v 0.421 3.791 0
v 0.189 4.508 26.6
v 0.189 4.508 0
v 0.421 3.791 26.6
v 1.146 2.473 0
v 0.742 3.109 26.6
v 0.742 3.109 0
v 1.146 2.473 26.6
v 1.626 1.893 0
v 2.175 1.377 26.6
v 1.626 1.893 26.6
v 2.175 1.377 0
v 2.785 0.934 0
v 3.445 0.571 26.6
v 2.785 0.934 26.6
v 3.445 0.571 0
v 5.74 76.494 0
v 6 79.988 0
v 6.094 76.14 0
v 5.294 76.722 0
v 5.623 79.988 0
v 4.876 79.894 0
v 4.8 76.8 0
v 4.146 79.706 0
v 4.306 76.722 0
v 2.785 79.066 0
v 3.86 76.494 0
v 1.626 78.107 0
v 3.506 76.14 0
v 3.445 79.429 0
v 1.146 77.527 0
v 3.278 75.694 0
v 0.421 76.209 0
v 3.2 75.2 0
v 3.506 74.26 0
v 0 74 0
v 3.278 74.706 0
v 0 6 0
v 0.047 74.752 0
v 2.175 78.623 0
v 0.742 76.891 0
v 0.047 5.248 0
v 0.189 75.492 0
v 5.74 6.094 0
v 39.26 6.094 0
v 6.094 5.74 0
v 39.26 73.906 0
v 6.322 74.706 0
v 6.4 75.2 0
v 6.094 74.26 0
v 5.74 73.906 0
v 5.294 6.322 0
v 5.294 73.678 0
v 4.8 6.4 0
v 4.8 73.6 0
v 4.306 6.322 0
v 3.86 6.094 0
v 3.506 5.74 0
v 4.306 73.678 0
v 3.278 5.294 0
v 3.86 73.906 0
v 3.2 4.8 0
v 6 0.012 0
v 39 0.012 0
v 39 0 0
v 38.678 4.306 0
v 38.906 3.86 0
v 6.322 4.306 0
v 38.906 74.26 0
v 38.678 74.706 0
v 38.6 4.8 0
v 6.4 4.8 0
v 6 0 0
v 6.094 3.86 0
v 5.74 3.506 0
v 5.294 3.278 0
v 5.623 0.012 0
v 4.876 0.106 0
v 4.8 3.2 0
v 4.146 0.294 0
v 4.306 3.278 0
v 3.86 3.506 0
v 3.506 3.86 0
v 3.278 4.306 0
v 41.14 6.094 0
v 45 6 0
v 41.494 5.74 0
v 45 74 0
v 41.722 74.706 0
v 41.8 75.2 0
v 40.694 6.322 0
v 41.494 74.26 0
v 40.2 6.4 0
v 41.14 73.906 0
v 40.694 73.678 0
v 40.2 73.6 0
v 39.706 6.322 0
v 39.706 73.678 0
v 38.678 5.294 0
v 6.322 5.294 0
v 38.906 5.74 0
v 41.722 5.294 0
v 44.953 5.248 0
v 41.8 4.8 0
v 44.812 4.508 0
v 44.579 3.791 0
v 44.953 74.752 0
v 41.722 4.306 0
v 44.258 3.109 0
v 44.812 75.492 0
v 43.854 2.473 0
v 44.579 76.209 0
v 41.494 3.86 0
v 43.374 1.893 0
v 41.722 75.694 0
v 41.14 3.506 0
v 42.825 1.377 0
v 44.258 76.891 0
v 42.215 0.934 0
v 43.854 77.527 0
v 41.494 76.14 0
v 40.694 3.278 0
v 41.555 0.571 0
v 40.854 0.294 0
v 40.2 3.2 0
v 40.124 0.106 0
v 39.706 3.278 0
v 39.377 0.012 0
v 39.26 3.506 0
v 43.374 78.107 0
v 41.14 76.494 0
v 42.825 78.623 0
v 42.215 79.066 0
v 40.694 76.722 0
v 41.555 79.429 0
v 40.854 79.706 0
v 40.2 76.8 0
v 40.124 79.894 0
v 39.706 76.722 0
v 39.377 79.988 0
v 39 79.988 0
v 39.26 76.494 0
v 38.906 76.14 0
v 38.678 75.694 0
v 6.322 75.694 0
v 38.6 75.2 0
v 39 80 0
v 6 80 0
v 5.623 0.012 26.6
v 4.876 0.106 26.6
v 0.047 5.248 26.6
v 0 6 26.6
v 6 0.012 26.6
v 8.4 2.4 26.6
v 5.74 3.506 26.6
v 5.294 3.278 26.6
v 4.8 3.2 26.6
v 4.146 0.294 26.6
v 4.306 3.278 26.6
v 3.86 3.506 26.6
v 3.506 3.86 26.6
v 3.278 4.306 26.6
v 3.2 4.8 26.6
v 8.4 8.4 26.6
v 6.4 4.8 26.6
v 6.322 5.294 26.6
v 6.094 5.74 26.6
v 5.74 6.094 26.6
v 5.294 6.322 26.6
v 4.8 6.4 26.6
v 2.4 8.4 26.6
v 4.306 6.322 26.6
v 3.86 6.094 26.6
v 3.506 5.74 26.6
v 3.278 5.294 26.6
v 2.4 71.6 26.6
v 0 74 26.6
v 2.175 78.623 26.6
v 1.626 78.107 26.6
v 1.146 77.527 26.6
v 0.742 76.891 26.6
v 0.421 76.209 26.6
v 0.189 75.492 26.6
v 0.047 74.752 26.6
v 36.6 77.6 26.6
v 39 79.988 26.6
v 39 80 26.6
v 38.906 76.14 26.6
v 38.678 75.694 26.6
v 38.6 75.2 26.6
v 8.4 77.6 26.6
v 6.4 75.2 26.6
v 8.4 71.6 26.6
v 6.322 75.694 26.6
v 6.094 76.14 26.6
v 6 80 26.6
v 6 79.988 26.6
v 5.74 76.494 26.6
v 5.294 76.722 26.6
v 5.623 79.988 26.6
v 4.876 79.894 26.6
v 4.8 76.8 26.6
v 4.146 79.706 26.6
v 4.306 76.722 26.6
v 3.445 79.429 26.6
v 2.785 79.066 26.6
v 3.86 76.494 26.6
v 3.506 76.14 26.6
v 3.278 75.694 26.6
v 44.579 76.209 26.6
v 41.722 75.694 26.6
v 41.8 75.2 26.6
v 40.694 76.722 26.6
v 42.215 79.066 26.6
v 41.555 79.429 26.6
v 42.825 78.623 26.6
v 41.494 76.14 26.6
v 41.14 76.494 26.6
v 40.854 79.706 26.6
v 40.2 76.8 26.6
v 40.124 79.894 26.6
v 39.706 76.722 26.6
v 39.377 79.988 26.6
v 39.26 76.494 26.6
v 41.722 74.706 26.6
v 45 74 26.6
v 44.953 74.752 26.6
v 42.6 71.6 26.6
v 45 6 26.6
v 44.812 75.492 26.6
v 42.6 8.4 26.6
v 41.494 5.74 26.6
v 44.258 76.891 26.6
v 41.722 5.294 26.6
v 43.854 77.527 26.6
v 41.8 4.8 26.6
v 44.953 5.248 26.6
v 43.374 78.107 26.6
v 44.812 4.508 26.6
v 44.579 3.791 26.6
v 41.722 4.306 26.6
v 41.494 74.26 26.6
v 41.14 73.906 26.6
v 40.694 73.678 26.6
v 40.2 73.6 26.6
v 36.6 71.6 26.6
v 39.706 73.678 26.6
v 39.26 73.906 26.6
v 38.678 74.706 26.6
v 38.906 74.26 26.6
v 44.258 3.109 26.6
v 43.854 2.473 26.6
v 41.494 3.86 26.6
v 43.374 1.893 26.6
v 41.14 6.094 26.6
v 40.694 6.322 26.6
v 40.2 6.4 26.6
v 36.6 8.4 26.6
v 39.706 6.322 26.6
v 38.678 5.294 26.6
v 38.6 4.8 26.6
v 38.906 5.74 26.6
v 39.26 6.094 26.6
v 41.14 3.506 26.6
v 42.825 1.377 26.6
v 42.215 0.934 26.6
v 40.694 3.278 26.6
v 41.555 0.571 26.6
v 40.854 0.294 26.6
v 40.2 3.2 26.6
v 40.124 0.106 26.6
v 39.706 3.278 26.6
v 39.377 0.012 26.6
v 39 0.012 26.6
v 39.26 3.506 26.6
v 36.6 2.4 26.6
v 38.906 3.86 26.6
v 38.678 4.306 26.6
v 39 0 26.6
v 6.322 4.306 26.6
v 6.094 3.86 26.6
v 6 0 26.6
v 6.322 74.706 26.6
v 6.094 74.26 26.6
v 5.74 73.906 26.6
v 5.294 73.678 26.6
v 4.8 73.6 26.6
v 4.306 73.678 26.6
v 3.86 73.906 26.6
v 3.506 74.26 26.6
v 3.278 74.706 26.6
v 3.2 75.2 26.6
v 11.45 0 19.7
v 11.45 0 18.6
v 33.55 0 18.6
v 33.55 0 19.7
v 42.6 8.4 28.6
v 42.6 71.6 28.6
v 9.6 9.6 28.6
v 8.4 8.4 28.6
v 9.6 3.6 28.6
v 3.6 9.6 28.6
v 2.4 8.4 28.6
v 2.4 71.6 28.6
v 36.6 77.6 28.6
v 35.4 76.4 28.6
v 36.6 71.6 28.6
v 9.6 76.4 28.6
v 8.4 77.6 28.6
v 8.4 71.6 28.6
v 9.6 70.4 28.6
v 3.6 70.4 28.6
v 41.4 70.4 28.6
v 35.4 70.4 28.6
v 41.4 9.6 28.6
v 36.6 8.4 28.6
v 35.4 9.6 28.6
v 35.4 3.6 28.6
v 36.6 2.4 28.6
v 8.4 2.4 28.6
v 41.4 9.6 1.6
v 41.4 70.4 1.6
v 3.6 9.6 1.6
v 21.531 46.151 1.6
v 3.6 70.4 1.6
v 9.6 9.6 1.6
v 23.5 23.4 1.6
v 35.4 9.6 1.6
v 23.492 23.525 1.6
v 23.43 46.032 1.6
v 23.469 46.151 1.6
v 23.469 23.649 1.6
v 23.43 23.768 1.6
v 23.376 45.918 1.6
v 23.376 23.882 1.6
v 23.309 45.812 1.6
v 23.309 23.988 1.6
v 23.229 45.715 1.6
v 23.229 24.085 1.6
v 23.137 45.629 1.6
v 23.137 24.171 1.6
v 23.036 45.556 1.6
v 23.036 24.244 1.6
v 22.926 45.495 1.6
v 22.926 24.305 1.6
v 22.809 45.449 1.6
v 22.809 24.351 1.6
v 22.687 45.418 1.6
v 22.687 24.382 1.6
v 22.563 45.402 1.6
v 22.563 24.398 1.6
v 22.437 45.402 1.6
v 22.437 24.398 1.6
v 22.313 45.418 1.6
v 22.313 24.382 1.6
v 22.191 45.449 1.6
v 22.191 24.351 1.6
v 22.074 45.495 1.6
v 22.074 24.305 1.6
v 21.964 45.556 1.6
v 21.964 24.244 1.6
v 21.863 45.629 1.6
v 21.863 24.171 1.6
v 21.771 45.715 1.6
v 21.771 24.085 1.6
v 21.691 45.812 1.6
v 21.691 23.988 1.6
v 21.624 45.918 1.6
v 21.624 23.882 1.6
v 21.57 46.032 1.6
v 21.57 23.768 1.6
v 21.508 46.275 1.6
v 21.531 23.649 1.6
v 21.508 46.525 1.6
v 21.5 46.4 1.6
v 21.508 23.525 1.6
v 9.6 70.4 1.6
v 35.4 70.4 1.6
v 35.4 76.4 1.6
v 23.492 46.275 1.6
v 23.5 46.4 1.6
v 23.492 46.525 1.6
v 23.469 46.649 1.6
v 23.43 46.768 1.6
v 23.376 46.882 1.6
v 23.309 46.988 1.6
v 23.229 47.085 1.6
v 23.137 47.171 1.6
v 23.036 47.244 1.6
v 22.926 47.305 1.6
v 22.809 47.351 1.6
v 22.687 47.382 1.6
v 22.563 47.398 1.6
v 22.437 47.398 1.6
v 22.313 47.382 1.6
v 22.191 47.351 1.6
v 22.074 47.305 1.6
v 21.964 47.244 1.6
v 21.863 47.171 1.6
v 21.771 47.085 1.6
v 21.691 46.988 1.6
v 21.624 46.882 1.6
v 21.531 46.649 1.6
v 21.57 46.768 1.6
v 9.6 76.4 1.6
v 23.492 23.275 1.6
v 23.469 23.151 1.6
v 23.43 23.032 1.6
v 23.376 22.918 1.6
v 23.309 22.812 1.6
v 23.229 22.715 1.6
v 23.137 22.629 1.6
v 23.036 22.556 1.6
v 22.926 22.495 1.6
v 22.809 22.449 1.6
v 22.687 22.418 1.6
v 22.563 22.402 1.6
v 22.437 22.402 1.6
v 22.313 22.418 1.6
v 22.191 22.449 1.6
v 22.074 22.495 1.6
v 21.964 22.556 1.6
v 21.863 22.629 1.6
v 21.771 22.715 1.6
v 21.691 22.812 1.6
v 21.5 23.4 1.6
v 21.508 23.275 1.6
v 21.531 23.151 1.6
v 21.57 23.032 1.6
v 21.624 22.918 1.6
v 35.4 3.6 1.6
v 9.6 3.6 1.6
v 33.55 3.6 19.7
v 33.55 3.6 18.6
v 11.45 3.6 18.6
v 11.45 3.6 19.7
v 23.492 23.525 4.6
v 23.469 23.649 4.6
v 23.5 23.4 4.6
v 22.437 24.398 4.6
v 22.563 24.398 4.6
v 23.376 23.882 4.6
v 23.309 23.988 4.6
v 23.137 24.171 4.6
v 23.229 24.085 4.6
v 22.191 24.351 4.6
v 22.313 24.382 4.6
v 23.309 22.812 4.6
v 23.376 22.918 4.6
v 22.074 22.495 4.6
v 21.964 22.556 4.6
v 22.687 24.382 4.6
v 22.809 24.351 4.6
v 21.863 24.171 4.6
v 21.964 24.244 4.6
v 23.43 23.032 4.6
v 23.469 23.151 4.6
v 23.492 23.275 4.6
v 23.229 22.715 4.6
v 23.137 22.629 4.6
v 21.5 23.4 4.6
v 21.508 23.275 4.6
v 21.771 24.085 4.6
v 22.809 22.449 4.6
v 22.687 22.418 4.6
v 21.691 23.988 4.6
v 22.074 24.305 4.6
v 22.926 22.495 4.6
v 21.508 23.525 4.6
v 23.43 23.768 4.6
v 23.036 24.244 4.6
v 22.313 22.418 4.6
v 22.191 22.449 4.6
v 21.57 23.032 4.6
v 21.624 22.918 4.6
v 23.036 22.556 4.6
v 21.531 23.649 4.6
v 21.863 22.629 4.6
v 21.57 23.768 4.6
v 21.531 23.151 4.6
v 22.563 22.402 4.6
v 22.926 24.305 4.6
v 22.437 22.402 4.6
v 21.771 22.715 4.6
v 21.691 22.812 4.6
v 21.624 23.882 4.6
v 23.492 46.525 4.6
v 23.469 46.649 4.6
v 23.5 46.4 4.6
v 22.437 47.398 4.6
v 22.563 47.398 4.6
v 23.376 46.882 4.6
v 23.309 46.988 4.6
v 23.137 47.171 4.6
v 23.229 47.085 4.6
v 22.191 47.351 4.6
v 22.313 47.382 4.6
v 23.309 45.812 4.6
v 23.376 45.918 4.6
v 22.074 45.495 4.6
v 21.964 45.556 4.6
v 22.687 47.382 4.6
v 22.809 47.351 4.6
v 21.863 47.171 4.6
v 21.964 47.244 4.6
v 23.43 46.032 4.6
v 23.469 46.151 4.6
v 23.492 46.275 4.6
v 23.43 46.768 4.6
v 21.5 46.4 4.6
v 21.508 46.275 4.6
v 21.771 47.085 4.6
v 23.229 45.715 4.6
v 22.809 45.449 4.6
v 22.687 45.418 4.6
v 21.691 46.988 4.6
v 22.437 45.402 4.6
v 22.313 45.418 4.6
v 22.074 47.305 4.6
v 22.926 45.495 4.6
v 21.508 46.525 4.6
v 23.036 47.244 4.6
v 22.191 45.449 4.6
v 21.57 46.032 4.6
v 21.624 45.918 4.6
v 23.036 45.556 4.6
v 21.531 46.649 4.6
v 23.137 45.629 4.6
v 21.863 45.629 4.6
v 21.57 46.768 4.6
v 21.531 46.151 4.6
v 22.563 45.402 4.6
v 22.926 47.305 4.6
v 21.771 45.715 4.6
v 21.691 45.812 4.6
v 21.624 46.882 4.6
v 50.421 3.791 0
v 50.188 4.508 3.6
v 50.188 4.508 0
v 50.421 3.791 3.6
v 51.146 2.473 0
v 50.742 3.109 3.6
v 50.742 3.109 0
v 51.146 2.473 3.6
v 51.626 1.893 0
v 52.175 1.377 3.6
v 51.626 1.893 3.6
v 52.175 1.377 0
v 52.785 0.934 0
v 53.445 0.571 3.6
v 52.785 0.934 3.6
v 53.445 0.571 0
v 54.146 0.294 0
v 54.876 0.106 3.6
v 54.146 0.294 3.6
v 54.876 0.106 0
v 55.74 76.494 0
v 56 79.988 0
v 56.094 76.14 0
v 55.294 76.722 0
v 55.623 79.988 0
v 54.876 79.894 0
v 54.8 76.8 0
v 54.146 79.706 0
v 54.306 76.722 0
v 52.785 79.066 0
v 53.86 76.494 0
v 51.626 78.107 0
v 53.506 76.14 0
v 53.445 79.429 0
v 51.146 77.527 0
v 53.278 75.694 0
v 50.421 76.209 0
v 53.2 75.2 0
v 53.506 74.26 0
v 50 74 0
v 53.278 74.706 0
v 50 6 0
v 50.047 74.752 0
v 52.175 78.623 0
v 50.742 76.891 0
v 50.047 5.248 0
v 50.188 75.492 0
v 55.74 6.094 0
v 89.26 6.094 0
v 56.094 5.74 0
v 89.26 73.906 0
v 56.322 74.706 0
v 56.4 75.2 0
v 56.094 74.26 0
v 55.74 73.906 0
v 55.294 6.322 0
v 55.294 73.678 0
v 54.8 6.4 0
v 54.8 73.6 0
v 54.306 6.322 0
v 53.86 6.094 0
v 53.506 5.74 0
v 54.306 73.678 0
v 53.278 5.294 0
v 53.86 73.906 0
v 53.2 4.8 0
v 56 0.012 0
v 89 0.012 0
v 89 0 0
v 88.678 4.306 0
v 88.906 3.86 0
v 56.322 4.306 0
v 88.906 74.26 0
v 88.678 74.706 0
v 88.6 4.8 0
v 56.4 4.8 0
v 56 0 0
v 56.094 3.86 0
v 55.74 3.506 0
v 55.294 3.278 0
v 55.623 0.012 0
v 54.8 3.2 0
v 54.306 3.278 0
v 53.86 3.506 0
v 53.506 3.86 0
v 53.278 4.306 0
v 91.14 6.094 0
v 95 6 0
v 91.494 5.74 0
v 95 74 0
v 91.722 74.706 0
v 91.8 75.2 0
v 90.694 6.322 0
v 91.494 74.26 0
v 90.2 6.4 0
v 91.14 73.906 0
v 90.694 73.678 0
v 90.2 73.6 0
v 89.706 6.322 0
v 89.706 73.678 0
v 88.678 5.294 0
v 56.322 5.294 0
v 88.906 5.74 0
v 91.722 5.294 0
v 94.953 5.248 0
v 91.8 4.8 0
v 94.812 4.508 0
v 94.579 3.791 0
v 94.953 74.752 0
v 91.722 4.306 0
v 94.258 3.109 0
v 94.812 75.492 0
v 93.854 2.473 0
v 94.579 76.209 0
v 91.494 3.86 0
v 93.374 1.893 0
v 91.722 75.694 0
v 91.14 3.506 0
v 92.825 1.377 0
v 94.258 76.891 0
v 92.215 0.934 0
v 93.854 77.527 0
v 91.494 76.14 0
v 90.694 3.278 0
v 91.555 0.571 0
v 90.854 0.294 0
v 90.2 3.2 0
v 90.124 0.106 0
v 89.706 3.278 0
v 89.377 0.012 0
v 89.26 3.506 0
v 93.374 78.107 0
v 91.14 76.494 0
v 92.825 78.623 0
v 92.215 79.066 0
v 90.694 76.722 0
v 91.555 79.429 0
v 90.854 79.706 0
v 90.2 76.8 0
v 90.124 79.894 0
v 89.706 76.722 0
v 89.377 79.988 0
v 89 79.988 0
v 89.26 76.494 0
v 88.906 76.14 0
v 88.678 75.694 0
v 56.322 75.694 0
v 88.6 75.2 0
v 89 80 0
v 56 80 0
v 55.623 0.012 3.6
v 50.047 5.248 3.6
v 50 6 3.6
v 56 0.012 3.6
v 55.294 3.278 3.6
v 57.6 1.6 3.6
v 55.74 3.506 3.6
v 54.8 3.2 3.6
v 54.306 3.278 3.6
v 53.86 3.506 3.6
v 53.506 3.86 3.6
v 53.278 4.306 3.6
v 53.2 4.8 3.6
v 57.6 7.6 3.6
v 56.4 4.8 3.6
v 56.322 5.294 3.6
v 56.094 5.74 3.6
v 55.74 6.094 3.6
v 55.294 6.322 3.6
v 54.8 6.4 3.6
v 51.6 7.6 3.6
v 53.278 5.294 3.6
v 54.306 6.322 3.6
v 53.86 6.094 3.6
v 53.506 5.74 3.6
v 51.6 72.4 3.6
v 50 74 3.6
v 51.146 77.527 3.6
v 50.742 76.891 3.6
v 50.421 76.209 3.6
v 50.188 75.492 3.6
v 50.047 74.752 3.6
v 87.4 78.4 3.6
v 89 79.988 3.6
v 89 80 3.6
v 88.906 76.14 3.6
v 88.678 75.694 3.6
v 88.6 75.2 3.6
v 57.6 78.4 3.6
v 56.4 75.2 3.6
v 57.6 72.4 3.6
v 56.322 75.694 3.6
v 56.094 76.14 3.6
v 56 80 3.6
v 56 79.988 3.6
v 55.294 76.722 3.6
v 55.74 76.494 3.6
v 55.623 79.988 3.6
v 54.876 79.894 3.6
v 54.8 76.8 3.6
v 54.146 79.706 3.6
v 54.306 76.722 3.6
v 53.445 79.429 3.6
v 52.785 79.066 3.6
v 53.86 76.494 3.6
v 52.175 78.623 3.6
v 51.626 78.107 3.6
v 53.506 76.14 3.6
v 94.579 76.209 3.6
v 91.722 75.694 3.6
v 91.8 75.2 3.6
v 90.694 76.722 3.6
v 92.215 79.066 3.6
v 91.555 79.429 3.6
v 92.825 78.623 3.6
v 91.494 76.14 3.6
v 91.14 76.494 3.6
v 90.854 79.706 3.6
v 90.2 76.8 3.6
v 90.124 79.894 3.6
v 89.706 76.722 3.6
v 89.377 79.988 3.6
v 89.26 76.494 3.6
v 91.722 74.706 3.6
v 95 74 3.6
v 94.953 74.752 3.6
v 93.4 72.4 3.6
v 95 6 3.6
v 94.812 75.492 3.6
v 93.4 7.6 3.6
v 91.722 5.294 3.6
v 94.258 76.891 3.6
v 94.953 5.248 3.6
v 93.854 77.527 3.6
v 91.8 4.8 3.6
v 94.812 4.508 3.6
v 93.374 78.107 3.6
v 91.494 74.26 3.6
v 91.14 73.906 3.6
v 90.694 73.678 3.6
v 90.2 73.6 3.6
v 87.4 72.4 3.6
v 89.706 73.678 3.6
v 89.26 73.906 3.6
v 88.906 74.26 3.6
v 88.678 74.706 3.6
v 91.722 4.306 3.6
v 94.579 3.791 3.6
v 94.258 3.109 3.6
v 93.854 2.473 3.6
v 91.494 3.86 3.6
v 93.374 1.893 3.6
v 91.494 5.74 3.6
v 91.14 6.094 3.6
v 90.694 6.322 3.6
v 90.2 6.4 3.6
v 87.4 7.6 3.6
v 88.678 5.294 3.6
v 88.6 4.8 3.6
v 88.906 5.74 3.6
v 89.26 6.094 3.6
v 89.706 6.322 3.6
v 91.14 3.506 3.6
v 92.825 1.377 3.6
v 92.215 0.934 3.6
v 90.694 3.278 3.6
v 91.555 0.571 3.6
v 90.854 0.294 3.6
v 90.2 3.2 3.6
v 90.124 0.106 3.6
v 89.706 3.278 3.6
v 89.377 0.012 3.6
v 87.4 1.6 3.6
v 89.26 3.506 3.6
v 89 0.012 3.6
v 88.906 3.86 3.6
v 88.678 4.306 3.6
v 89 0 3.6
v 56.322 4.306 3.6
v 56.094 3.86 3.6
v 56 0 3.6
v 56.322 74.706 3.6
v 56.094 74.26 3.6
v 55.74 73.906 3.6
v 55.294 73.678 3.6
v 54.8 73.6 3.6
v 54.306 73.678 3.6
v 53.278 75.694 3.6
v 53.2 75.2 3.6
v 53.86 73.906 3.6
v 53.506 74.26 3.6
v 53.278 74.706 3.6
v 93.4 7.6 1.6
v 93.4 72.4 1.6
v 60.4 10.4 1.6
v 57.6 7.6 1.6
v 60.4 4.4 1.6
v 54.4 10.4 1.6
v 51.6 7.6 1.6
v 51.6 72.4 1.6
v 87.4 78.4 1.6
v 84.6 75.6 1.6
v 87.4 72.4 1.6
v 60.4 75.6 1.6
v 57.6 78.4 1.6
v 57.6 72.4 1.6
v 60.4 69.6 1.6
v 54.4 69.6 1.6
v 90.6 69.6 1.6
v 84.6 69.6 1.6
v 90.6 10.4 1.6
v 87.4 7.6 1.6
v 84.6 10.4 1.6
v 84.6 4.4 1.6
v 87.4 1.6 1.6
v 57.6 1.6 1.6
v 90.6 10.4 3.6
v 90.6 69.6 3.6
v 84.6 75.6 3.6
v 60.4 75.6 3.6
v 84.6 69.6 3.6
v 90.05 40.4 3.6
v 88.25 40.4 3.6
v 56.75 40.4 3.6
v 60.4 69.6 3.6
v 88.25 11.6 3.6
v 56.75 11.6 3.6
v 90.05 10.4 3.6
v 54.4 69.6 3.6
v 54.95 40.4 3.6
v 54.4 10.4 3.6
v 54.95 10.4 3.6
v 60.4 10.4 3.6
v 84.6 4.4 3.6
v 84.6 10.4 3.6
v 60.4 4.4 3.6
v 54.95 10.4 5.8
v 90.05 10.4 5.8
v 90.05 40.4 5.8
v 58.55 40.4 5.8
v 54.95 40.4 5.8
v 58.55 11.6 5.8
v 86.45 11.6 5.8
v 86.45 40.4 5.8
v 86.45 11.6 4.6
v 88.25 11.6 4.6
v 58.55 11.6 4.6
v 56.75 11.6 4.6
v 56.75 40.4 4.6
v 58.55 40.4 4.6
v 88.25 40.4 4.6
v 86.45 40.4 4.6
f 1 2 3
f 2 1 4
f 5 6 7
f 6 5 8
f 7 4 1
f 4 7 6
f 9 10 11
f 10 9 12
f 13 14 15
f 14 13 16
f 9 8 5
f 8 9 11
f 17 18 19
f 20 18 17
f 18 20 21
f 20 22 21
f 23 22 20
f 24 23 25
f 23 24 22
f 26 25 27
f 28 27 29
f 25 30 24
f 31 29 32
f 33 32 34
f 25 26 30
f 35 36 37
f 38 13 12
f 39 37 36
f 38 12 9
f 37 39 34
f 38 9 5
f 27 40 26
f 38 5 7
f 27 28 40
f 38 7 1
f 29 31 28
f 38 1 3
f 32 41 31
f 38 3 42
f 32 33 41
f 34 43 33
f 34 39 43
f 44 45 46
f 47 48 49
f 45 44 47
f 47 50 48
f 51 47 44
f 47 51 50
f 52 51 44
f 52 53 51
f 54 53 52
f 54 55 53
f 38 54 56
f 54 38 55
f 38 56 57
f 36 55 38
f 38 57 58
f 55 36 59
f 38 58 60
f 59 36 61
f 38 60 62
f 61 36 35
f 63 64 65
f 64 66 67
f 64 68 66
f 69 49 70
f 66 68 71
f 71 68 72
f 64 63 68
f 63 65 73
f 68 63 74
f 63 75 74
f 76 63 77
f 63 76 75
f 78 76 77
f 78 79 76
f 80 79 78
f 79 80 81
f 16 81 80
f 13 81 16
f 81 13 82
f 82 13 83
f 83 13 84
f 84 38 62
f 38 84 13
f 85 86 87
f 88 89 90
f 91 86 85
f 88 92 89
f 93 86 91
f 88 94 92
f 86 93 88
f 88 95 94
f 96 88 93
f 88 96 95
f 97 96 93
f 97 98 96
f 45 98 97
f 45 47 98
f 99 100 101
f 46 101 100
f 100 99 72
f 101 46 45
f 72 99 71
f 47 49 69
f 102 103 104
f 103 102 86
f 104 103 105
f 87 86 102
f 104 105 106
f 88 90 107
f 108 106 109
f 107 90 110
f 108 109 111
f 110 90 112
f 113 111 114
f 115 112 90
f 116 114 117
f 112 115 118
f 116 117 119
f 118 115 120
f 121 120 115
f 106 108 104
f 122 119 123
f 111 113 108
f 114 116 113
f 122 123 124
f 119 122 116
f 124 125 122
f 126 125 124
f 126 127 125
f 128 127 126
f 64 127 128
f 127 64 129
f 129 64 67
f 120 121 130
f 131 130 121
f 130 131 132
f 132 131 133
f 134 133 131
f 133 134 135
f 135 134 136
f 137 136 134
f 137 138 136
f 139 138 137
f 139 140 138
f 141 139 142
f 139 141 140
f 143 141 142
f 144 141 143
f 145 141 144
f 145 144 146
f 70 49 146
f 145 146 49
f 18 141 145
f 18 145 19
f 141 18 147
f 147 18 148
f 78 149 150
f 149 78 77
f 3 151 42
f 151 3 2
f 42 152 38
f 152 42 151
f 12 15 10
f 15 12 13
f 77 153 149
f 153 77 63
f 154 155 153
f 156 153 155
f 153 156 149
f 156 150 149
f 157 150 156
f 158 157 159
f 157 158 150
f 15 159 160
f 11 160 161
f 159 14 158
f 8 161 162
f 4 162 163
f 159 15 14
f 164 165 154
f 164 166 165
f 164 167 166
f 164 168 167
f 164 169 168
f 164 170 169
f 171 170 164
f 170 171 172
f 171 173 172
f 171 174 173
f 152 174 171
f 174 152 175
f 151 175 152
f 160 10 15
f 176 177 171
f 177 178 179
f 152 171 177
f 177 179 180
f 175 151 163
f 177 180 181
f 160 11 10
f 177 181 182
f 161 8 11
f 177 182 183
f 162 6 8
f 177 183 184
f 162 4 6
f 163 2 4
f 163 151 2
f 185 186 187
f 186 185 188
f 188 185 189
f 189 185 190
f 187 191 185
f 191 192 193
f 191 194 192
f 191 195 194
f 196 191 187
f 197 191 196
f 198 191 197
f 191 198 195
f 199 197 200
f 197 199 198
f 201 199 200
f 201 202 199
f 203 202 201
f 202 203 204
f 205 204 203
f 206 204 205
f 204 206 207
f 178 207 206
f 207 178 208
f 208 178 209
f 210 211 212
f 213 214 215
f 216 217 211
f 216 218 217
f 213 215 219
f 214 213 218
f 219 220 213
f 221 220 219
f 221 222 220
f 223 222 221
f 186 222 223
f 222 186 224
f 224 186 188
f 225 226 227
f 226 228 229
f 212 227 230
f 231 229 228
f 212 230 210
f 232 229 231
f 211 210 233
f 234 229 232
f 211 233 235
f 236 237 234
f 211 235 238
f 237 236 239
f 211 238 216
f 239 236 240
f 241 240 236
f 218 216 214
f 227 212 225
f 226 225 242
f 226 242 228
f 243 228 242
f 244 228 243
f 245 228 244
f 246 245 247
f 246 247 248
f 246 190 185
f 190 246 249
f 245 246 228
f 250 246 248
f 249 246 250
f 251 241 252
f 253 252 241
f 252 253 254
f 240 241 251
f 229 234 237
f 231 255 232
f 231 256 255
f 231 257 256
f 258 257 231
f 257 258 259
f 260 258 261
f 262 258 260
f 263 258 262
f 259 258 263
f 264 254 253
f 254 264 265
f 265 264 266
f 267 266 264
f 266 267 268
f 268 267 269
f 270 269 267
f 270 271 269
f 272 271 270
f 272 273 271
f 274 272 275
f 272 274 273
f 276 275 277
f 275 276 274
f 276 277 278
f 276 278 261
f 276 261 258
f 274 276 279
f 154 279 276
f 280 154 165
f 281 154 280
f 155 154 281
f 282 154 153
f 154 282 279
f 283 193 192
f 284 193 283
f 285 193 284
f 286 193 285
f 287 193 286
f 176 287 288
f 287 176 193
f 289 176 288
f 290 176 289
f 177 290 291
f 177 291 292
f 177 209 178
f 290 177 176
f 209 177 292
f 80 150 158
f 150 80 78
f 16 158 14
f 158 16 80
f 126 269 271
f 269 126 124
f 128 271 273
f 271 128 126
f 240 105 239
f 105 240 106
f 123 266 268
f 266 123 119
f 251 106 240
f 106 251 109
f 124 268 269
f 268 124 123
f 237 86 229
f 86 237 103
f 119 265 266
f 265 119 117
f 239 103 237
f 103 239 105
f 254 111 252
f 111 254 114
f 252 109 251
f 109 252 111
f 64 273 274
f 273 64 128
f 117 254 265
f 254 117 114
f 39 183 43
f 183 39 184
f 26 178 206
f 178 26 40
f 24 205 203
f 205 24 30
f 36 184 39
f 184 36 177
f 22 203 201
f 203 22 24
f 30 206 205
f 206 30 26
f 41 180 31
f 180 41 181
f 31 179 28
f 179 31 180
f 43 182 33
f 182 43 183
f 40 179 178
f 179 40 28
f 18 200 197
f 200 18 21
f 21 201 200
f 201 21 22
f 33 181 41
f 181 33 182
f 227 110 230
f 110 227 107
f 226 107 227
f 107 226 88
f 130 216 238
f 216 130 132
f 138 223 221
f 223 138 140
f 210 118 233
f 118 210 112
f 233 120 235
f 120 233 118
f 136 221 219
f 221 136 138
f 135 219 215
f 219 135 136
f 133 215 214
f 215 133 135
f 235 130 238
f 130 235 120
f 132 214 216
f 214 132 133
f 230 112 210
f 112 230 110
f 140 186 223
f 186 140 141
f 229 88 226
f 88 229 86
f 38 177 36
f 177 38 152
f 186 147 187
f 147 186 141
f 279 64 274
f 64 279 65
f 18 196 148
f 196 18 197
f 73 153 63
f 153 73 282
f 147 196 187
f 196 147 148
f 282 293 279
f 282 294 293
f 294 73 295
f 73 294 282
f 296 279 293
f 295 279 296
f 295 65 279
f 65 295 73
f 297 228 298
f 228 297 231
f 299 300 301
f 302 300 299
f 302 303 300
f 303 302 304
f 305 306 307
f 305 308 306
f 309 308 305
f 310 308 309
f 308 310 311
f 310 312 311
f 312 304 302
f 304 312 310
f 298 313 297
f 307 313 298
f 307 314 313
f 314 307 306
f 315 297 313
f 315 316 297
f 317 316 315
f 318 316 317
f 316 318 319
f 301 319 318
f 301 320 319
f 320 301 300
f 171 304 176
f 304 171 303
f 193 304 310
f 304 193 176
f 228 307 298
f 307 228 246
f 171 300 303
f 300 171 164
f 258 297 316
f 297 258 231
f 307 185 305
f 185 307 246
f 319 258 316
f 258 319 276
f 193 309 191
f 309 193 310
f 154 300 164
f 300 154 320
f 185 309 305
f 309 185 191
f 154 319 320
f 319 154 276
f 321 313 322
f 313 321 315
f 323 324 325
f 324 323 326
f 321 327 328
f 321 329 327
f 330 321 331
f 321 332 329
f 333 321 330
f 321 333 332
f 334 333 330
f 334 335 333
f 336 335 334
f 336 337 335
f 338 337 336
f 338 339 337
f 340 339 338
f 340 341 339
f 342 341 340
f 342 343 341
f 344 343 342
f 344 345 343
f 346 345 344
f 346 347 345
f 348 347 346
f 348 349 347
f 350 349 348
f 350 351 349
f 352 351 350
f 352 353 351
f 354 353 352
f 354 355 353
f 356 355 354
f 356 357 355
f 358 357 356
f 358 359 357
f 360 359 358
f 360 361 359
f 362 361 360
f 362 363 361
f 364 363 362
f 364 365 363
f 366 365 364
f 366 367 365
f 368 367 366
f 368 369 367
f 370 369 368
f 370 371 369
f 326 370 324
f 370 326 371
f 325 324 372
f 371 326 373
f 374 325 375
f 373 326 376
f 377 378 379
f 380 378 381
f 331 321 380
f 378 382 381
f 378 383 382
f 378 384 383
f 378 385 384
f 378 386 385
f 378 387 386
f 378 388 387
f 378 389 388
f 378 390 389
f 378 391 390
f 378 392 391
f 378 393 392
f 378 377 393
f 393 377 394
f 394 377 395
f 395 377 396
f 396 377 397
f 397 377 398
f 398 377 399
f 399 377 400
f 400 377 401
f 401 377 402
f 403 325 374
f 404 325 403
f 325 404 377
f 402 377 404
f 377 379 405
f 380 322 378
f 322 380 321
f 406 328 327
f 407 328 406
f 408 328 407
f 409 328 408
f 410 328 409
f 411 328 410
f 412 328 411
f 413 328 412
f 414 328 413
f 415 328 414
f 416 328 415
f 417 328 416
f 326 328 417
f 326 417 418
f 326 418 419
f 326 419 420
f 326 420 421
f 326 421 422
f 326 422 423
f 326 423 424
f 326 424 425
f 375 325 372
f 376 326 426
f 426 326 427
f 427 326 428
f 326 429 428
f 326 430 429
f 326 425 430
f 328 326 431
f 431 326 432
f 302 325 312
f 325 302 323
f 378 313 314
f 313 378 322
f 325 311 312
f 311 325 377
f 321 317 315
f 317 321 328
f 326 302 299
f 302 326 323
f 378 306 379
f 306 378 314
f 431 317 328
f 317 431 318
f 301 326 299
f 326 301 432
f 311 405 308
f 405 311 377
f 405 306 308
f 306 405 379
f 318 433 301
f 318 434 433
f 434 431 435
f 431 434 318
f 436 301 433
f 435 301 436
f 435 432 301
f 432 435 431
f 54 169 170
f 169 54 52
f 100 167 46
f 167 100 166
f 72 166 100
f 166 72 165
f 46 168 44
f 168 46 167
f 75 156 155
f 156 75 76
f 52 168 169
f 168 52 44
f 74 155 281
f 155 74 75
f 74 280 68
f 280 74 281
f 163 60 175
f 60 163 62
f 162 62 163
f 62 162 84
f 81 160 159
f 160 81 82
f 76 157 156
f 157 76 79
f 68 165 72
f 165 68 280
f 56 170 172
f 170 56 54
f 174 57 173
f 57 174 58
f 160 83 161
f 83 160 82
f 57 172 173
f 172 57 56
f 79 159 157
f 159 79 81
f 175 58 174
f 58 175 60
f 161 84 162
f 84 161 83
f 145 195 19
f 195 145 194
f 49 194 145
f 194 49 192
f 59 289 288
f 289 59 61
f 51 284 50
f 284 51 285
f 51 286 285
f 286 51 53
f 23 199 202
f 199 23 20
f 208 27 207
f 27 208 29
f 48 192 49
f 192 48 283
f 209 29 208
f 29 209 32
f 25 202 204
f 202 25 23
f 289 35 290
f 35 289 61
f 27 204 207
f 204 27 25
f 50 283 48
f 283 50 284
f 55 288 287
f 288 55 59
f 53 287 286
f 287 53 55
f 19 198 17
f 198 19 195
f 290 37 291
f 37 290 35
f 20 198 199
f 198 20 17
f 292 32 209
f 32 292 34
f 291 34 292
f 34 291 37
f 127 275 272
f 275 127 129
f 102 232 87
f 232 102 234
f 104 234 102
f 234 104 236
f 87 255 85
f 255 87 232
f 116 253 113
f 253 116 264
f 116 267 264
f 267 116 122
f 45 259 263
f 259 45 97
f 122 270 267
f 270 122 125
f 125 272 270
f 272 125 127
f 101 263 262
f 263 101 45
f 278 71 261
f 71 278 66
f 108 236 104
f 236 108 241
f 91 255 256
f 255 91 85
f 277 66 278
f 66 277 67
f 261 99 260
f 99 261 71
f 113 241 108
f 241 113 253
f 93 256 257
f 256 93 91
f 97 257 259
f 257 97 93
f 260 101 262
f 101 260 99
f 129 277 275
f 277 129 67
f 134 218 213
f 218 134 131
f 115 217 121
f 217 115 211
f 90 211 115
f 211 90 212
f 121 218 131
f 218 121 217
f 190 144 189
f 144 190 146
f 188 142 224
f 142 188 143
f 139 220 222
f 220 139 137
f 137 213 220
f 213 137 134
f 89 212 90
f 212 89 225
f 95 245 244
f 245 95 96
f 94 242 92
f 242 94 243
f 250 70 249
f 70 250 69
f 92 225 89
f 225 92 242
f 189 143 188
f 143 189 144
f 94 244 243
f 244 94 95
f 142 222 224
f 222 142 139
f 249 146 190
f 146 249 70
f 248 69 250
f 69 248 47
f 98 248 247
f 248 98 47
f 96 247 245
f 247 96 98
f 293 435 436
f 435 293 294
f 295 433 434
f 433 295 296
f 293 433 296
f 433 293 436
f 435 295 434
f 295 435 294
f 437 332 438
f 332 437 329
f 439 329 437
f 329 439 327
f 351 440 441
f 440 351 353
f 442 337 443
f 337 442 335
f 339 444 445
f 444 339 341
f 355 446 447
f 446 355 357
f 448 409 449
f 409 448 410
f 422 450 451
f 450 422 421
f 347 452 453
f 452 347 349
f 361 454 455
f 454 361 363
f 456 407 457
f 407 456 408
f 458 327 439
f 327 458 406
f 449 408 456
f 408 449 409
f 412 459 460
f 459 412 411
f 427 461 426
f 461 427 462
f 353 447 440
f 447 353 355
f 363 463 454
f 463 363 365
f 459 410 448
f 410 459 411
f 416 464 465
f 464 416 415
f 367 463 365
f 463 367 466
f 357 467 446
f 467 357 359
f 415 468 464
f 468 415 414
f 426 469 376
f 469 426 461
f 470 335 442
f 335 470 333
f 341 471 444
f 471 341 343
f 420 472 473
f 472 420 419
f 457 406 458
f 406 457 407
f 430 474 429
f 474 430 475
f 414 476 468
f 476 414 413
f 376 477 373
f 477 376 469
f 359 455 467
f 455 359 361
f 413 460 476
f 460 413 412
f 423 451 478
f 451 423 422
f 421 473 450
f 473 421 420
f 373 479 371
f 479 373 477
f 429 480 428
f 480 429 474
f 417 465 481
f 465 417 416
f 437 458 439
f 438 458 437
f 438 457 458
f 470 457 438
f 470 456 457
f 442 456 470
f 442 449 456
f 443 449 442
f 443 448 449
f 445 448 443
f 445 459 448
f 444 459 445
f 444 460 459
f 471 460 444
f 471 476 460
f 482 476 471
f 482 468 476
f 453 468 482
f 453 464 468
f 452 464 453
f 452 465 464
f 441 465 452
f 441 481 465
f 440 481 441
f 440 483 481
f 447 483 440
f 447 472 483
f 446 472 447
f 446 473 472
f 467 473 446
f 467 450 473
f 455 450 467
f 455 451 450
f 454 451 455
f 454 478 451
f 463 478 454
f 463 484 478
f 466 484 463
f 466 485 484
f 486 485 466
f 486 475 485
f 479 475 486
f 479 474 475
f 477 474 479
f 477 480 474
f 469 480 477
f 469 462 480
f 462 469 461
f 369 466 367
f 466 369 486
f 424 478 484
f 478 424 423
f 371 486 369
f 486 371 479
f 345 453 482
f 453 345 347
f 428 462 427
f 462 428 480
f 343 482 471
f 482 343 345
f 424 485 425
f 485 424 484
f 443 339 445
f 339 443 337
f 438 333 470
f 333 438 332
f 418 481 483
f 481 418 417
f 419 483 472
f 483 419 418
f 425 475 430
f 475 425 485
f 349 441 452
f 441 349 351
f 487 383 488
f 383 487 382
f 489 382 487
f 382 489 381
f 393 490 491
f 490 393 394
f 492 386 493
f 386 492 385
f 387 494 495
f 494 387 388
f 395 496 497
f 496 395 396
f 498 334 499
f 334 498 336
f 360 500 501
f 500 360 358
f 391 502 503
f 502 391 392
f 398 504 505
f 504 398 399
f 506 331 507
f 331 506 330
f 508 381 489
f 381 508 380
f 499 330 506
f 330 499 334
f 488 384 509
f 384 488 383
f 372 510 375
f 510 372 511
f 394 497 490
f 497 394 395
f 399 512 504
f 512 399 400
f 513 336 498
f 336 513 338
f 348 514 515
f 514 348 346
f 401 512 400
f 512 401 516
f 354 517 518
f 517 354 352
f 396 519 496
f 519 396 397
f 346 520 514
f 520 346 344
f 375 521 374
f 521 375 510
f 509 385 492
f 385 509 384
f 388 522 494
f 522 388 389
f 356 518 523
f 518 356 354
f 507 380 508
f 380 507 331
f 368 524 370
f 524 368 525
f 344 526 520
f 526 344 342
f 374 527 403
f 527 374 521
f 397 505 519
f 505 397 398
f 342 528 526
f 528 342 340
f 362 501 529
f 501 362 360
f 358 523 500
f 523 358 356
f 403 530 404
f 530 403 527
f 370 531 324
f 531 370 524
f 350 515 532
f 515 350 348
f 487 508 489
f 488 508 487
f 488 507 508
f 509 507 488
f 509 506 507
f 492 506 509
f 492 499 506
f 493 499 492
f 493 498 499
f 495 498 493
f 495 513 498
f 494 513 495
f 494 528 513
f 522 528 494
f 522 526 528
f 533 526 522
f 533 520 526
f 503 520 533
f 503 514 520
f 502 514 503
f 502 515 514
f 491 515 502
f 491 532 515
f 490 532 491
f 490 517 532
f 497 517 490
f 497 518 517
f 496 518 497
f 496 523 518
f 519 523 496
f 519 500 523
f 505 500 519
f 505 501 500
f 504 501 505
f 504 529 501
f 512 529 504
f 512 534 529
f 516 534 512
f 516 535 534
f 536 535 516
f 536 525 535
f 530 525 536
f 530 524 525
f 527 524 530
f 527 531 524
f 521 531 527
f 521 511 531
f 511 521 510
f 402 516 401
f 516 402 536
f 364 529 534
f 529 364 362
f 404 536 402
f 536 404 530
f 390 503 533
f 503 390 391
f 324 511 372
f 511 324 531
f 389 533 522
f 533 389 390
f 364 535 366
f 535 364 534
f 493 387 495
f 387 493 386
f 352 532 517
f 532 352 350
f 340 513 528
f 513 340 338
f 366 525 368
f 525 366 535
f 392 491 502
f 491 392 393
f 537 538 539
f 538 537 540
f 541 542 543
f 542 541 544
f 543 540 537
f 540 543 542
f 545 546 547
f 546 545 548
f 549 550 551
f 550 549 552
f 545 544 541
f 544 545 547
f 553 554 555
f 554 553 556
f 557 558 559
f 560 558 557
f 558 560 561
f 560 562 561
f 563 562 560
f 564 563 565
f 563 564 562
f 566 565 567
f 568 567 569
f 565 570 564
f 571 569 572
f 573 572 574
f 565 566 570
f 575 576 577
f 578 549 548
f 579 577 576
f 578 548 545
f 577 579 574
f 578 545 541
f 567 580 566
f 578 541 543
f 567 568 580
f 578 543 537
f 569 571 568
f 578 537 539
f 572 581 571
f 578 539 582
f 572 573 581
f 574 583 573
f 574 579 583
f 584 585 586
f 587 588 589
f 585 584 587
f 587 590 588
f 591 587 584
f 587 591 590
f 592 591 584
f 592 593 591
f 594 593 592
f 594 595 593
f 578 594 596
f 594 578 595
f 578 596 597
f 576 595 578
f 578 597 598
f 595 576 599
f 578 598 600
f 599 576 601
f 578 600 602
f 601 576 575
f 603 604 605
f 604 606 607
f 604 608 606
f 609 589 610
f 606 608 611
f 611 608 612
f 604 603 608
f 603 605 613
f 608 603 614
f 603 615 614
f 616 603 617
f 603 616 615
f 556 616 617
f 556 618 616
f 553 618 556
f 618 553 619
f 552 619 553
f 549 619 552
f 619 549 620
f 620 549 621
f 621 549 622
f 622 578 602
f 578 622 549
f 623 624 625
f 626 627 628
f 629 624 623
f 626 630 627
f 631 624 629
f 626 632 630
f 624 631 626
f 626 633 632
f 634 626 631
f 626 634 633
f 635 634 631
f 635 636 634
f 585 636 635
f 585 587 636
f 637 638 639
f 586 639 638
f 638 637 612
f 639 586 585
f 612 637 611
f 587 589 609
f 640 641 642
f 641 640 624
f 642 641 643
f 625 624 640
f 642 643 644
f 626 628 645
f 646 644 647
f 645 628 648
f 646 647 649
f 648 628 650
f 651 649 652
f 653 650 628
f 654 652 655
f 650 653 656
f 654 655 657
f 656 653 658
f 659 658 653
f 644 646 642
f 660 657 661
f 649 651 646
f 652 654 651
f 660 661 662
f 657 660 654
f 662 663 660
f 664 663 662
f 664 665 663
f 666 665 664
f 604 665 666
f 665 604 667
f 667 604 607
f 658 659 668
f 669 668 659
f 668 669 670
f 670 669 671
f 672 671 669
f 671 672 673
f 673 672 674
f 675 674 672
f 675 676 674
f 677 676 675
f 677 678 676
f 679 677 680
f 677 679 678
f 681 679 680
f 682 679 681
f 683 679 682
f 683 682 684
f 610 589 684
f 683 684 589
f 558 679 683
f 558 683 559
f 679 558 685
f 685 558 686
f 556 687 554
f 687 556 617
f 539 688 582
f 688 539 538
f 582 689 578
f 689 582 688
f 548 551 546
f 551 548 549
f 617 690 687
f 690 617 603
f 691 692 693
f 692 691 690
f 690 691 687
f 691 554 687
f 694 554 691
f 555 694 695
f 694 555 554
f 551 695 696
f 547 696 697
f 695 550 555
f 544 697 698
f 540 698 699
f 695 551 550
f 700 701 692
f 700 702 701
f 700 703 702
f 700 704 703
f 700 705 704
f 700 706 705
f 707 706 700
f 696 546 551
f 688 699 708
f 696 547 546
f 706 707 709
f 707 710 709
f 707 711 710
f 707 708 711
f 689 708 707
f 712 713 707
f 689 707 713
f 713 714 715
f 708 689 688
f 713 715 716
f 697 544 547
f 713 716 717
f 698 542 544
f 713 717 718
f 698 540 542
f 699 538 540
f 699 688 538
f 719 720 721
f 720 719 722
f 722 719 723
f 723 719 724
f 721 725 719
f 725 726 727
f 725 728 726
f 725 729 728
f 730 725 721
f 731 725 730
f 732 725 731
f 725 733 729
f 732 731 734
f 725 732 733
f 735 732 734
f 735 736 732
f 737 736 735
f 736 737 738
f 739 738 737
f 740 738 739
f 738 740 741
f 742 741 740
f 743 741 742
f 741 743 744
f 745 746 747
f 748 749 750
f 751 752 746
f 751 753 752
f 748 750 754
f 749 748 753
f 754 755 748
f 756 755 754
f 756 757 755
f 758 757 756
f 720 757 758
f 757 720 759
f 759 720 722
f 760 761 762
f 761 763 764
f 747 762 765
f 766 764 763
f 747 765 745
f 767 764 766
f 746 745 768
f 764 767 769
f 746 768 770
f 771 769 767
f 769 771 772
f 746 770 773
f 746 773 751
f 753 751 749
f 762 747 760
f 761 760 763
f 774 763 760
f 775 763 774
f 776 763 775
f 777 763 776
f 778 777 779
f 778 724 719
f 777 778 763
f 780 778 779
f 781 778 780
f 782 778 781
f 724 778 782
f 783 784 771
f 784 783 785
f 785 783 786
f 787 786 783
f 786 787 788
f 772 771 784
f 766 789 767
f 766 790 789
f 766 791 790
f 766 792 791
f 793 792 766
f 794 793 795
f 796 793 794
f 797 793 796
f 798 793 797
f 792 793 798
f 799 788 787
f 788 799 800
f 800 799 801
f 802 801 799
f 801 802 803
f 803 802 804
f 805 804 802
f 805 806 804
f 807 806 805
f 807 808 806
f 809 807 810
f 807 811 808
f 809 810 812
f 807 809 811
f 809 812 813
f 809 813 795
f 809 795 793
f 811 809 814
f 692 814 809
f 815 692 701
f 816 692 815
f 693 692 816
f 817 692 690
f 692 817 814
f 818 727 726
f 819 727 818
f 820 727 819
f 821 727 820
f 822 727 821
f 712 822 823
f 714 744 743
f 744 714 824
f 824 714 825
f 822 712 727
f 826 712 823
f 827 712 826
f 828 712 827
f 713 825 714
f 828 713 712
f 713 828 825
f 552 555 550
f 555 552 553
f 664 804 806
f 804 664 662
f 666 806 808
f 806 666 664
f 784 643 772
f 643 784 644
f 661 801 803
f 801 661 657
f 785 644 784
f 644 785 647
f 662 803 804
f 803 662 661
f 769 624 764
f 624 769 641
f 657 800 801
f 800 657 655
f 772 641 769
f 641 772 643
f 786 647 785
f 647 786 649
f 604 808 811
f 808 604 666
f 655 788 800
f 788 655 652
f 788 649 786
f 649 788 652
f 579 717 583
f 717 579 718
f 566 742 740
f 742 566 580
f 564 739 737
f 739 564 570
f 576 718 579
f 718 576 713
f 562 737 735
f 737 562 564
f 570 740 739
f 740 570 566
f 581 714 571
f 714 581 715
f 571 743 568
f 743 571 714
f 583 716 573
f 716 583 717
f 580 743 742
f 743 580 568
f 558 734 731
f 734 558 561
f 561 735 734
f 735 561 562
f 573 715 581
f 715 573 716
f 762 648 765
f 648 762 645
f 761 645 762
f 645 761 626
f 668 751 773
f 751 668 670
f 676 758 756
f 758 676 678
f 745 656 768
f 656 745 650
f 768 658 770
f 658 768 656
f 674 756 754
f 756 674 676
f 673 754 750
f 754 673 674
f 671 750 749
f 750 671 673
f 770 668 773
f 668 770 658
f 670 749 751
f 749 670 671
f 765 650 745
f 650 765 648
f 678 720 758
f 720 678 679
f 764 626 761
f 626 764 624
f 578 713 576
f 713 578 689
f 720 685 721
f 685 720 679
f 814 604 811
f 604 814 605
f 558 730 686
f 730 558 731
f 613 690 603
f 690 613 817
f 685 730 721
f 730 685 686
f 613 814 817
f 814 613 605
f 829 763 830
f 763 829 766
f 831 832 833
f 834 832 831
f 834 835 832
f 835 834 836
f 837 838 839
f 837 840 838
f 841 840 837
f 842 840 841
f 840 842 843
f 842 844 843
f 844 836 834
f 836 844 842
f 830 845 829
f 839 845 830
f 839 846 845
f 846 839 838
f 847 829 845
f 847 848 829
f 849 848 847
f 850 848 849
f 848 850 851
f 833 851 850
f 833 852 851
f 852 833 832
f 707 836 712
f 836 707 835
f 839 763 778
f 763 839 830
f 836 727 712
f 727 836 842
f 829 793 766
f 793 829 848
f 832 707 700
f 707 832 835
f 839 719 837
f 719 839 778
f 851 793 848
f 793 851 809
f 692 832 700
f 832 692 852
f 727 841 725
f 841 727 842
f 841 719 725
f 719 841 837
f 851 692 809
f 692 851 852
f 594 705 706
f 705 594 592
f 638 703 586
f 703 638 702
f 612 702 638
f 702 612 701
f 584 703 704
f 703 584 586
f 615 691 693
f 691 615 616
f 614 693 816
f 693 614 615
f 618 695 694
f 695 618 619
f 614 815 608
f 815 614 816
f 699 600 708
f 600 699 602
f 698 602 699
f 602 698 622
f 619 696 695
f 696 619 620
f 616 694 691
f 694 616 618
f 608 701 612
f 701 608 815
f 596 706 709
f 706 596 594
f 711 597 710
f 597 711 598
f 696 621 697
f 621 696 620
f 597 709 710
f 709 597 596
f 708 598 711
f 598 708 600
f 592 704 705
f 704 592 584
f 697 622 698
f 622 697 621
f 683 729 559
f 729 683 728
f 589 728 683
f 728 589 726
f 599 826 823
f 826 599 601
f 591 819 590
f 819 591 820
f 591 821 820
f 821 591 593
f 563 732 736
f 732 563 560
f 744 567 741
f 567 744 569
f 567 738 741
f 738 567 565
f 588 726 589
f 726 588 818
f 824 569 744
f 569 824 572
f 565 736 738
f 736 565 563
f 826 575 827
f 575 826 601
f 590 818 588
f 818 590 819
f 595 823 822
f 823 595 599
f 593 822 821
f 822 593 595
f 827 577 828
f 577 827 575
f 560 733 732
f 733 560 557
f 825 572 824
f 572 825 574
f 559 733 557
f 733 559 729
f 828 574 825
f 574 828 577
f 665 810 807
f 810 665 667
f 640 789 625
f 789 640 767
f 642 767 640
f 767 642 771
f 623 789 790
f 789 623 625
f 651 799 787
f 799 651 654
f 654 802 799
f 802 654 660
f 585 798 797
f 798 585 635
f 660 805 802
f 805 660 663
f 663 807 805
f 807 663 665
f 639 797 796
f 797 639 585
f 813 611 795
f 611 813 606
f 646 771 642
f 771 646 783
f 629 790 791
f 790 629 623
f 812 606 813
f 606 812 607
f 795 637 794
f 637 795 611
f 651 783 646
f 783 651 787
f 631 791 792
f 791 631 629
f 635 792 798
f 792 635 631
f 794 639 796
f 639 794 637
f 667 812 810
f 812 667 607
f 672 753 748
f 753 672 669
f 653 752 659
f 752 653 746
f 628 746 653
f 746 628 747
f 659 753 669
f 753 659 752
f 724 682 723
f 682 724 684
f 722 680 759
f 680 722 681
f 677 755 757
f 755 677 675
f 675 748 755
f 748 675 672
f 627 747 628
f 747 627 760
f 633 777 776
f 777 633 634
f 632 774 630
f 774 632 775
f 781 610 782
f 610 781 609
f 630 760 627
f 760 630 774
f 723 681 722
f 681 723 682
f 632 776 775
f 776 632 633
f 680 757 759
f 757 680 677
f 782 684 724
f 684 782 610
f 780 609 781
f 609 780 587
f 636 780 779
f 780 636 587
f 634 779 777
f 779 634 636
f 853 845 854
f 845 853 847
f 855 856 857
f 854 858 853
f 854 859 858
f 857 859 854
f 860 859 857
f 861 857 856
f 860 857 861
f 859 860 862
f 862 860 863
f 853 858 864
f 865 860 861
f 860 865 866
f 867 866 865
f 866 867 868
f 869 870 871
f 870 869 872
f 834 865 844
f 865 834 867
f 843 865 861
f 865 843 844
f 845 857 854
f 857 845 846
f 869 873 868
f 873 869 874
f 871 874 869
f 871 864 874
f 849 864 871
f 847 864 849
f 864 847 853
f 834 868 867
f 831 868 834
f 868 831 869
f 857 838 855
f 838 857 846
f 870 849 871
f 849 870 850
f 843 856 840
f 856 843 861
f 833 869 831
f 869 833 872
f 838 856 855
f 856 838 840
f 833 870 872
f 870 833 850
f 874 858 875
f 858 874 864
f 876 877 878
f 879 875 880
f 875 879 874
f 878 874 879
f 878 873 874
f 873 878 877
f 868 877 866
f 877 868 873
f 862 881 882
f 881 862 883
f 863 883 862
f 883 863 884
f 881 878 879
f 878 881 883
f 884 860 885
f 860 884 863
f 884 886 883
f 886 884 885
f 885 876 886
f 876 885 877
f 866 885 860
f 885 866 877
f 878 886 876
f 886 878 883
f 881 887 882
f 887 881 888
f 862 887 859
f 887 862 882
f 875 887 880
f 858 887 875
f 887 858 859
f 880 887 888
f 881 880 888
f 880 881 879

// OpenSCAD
/* [Box Options] */
// Dimension: Box outer X-Size [mm]
box_Size_X          = 45;
// Dimension: Box outer Y-Size [mm]
box_Size_Y          = 80;
// Dimension: Box Inner height [mm]
box_Inner_Height    = 25;
// Box bottom/top thickness
box_BottomTop_Thickness =  1.6; // [0.6:0.2:3]
// Edge corner radius 
box_Screw_Corner_Radius   =  6; // [2:1:10]
// four outer screw hole diameters
box_Screw_Diameter     =  3.2; // [2:0.2:4]
// Box wall thickness
box_Wall_Thickness     =  3.6; // [0.4:0.2:3.2]
/* [Top Barrier Options] */
// Box barrier thickness
barrier_Thickness  =  1.2; // [0.4:0.2:3.2]
// Box barrier height
barrier_Height     =  2;   // [1.0:0.2:8]
// Additional width on the lid to correct for badly calibrated printers
barrier_Tolerance  =  0.8; // [0.0:0.1:1]
/* [Mouting Screw Nose Options] */
// Number of screw noses
screwnose_Number        = 0; // [0:No noses, 2: one top/one bottom, 4: two top/two bottom]
// Diameter of the noses' screw holes
screwnose_Diameter      = 4; // [2:0.2:8]
// Height of the noses
screwnose_Height        = 5; // [2:0.2:10]
// Wall thickness
screwnose_Wall_Thickness = 2.8; // [2:0.2:5]

// **************************
// ** Calculated globals
// **************************
boxHeight = box_Inner_Height+box_BottomTop_Thickness;

module box() {
	barrier_Thickness = box_Wall_Thickness-barrier_Thickness;
	difference() {
		union() {
			// solid round box, corners
			translate([box_Screw_Corner_Radius, box_Screw_Corner_Radius, 0]) cylinder(r=box_Screw_Corner_Radius, h=boxHeight, $fn=50); // bottom left
			translate([box_Size_X-box_Screw_Corner_Radius, box_Screw_Corner_Radius, 0]) cylinder(r=box_Screw_Corner_Radius, h=boxHeight, $fn=50); // bottom right
			translate([box_Screw_Corner_Radius, box_Size_Y-box_Screw_Corner_Radius, 0]) cylinder(r=box_Screw_Corner_Radius, h=boxHeight, $fn=50); // top left
			translate([box_Size_X-box_Screw_Corner_Radius, box_Size_Y-box_Screw_Corner_Radius, 0]) cylinder(r=box_Screw_Corner_Radius, h=boxHeight, $fn=50); // bottom right
			// solid round box, inner filling
			translate([0, box_Screw_Corner_Radius, 0]) cube([box_Size_X, box_Size_Y-2*box_Screw_Corner_Radius, boxHeight]);
			translate([box_Screw_Corner_Radius, 0, 0]) cube([box_Size_X-2*box_Screw_Corner_Radius, box_Size_Y, boxHeight]);
			// solid round box, top border
			translate([barrier_Thickness, box_Screw_Corner_Radius+barrier_Thickness, 0]) cube([box_Size_X-2*barrier_Thickness, box_Size_Y-2*box_Screw_Corner_Radius-2*barrier_Thickness, boxHeight+barrier_Height]);
			translate([box_Screw_Corner_Radius+barrier_Thickness, barrier_Thickness, 0]) cube([box_Size_X-2*box_Screw_Corner_Radius-2*barrier_Thickness, box_Size_Y-2*barrier_Thickness, boxHeight+barrier_Height]);
		}
		// inner cut-out
		translate([box_Wall_Thickness, box_Screw_Corner_Radius+box_Wall_Thickness, box_BottomTop_Thickness]) cube([box_Size_X-2*box_Wall_Thickness, box_Size_Y-2*box_Screw_Corner_Radius-2*box_Wall_Thickness, boxHeight+barrier_Height]);
		translate([box_Screw_Corner_Radius+box_Wall_Thickness, box_Wall_Thickness, box_BottomTop_Thickness]) cube([box_Size_X-2*box_Screw_Corner_Radius-2*box_Wall_Thickness, box_Size_Y-2*box_Wall_Thickness, boxHeight+barrier_Height]);
		// Screw holes
		translate([(box_Screw_Corner_Radius+box_Wall_Thickness)/2,(box_Screw_Corner_Radius+box_Wall_Thickness)/2,0]) cylinder(r=box_Screw_Diameter/2, h=boxHeight, $fn=20);
		translate([(box_Screw_Corner_Radius+box_Wall_Thickness)/2,box_Size_Y-(box_Screw_Corner_Radius+box_Wall_Thickness)/2,0]) cylinder(r=box_Screw_Diameter/2, h=boxHeight, $fn=20);
		translate([box_Size_X-(box_Screw_Corner_Radius+box_Wall_Thickness)/2,(box_Screw_Corner_Radius+box_Wall_Thickness)/2,0]) cylinder(r=box_Screw_Diameter/2, h=boxHeight, $fn=20);
		translate([box_Size_X-(box_Screw_Corner_Radius+box_Wall_Thickness)/2,box_Size_Y-(box_Screw_Corner_Radius+box_Wall_Thickness)/2,0]) cylinder(r=box_Screw_Diameter/2, h=boxHeight, $fn=20);
		// **************************
		// ** YOUR OWN CUTOUTS HERE!
		// **************************
		/*cRadius = 0.2;
		translate([box_Size_X/2+8,(box_Wall_Thickness+0.1), box_Wall_Thickness+((boxHeight-box_Wall_Thickness)/2)]) rotate([90,00,0]) cylinder(r=cRadius2, h=box_Wall_Thickness+0.2,$fn=50);
		cRadius2 = 0;*/
        cutWidth = 22.1;
        cutHeight = 1.1;
		/*translate([box_Size_X/2-8,(box_Wall_Thickness+0.1), box_Wall_Thickness+((boxHeight-box_Wall_Thickness)/2)]) rotate([90,00,0]) cylinder(r=cRadius, h=box_Wall_Thickness+0.2,$fn=50);*/
		translate([box_Size_X/2-cutWidth/2,(box_Wall_Thickness+0.1), box_BottomTop_Thickness+17]) rotate([90,00,0]) cube([cutWidth,cutHeight,box_Wall_Thickness+0.1]);
		// **************************
		// ** / CUTOUTS
		// **************************
	}
	// Lower nose(s)
	if (screwnose_Number==2) translate([box_Size_X/2, 0.001, 0]) mirror([0,1,0]) screwNose(screwnose_Diameter, screwnose_Height);
	if (screwnose_Number==4) {
		translate([box_Size_X*0.25, 0.001, 0]) mirror([0,1,0]) screwNose(screwnose_Diameter, screwnose_Height);
		translate([box_Size_X*0.75, 0.001, 0]) mirror([0,1,0]) screwNose(screwnose_Diameter, screwnose_Height);
	}
	// Upper nose(s)
	if (screwnose_Number==2) translate([box_Size_X/2, box_Size_Y-0.001, 0]) screwNose(screwnose_Diameter, screwnose_Height);
	if (screwnose_Number==4) {
		translate([box_Size_X*0.25, box_Size_Y-0.001, 0]) screwNose(screwnose_Diameter, screwnose_Height);
		translate([box_Size_X*0.75, box_Size_Y-0.001, 0]) screwNose(screwnose_Diameter, screwnose_Height);
	}
    
    // Battery holder
    translate([box_Size_X/2, box_Wall_Thickness+screwnose_Diameter+screwnose_Wall_Thickness+13, box_BottomTop_Thickness]) cylinder(r=1.0, h=3,$fn=50);
    // Battery holder
    translate([box_Size_X/2, box_Wall_Thickness+screwnose_Diameter+screwnose_Wall_Thickness+36, box_BottomTop_Thickness]) cylinder(r=1.0, h=3,$fn=50);
}

module lid() {
	boxHeight = box_BottomTop_Thickness+barrier_Height;
	difference() {
		union() {
			// solid round box, corners
			translate([box_Screw_Corner_Radius, box_Screw_Corner_Radius, 0]) cylinder(r=box_Screw_Corner_Radius, h=boxHeight, $fn=50); // bottom left
			translate([box_Size_X-box_Screw_Corner_Radius, box_Screw_Corner_Radius, 0]) cylinder(r=box_Screw_Corner_Radius, h=boxHeight, $fn=50); // bottom right
			translate([box_Screw_Corner_Radius, box_Size_Y-box_Screw_Corner_Radius, 0]) cylinder(r=box_Screw_Corner_Radius, h=boxHeight, $fn=50); // top left
			translate([box_Size_X-box_Screw_Corner_Radius, box_Size_Y-box_Screw_Corner_Radius, 0]) cylinder(r=box_Screw_Corner_Radius, h=boxHeight, $fn=50); // bottom right
			// solid round box, inner filling
			translate([0, box_Screw_Corner_Radius, 0]) cube([box_Size_X, box_Size_Y-2*box_Screw_Corner_Radius, boxHeight]);
			translate([box_Screw_Corner_Radius, 0, 0]) cube([box_Size_X-2*box_Screw_Corner_Radius, box_Size_Y, boxHeight]);
			// solid round box, top border
		}
		// inner cut-out X direction
		translate([
			box_Wall_Thickness-(barrier_Thickness+barrier_Tolerance),
			box_Screw_Corner_Radius+box_Wall_Thickness-(barrier_Thickness+barrier_Tolerance),
			box_BottomTop_Thickness
		]) cube([
			box_Size_X-2*(box_Wall_Thickness)+2*(barrier_Thickness+barrier_Tolerance),
			box_Size_Y-2*box_Screw_Corner_Radius-2*(box_Wall_Thickness)+2*(barrier_Thickness+barrier_Tolerance),
			box_BottomTop_Thickness+barrier_Height
		]);
		// inner cut-out Y direction
		translate([
			box_Screw_Corner_Radius+box_Wall_Thickness-(barrier_Thickness+barrier_Tolerance),
			box_Wall_Thickness-(barrier_Thickness+barrier_Tolerance),
			box_BottomTop_Thickness
		]) cube([
			box_Size_X-2*box_Screw_Corner_Radius-2*(box_Wall_Thickness)+2*(barrier_Thickness+barrier_Tolerance),
			box_Size_Y-2*(box_Wall_Thickness)+2*(barrier_Thickness+barrier_Tolerance),
			box_BottomTop_Thickness+barrier_Height
		]);
		
		// Screw holes
		translate([(box_Screw_Corner_Radius+box_Wall_Thickness)/2,(box_Screw_Corner_Radius+box_Wall_Thickness)/2,0]) cylinder(r=box_Screw_Diameter/2, h=boxHeight, $fn=20);
		translate([(box_Screw_Corner_Radius+box_Wall_Thickness)/2,box_Size_Y-(box_Screw_Corner_Radius+box_Wall_Thickness)/2,0]) cylinder(r=box_Screw_Diameter/2, h=boxHeight, $fn=20);
		translate([box_Size_X-(box_Screw_Corner_Radius+box_Wall_Thickness)/2,(box_Screw_Corner_Radius+box_Wall_Thickness)/2,0]) cylinder(r=box_Screw_Diameter/2, h=boxHeight, $fn=20);
		translate([box_Size_X-(box_Screw_Corner_Radius+box_Wall_Thickness)/2,box_Size_Y-(box_Screw_Corner_Radius+box_Wall_Thickness)/2,0]) cylinder(r=box_Screw_Diameter/2, h=boxHeight, $fn=20);
	}

	// inner add X direction
	translate([box_Wall_Thickness+barrier_Tolerance, box_Screw_Corner_Radius+box_Wall_Thickness+barrier_Tolerance, box_BottomTop_Thickness])
		cube([box_Size_X-2*(box_Wall_Thickness+barrier_Tolerance), box_Size_Y-2*(box_Screw_Corner_Radius+box_Wall_Thickness+barrier_Tolerance), barrier_Height]);
	// inner add Y direction
	translate([box_Screw_Corner_Radius+box_Wall_Thickness+barrier_Tolerance, box_Wall_Thickness+barrier_Tolerance, box_BottomTop_Thickness])
		cube([box_Size_X-2*(box_Screw_Corner_Radius+box_Wall_Thickness+barrier_Tolerance), box_Size_Y-2*(box_Wall_Thickness+barrier_Tolerance), barrier_Height]);
    
    // inner card holder
    card_x_input = 31.5;
    card_y_input = 1;
    card_z_input = 30;
    
    
    card_x = card_x_input+(2*box_Wall_Thickness/2);
    inner_x_width = box_Size_X-2*(box_Wall_Thickness+barrier_Tolerance);
    
	translate([box_Wall_Thickness+barrier_Tolerance+(inner_x_width-card_x)/2, box_Screw_Corner_Radius+box_Wall_Thickness+barrier_Tolerance, box_BottomTop_Thickness+barrier_Height])
		cube([card_x, box_Wall_Thickness/3, card_y_input+box_Wall_Thickness/3]);
	translate([box_Wall_Thickness+barrier_Tolerance+(inner_x_width-card_x)/2, box_Screw_Corner_Radius+box_Wall_Thickness+barrier_Tolerance, box_BottomTop_Thickness+barrier_Height])
		cube([box_Wall_Thickness/2, card_z_input, card_y_input]);
	translate([box_Wall_Thickness+barrier_Tolerance+(inner_x_width-card_x)/2, box_Screw_Corner_Radius+box_Wall_Thickness+barrier_Tolerance, box_BottomTop_Thickness+barrier_Height+card_y_input])
		cube([box_Wall_Thickness, card_z_input, box_Wall_Thickness/3]);
    
	translate([box_Wall_Thickness+barrier_Tolerance+(inner_x_width-card_x)/2+card_x-box_Wall_Thickness/2, box_Screw_Corner_Radius+box_Wall_Thickness+barrier_Tolerance, box_BottomTop_Thickness+barrier_Height])
		cube([box_Wall_Thickness/2, card_z_input, card_y_input]);
	translate([box_Wall_Thickness+barrier_Tolerance+(inner_x_width-card_x)/2+card_x-box_Wall_Thickness/2-box_Wall_Thickness/2, box_Screw_Corner_Radius+box_Wall_Thickness+barrier_Tolerance, box_BottomTop_Thickness+barrier_Height+card_y_input])
		cube([box_Wall_Thickness, card_z_input, box_Wall_Thickness/3]);
}


module screwNose(screwholeDiameter=4, noseHeight=5) {
	additionalDistanceFromWall = 1;
	translate([0,screwholeDiameter/2+screwnose_Wall_Thickness+additionalDistanceFromWall, 0]) difference() {
		union() {
			translate([-(screwholeDiameter/2+screwnose_Wall_Thickness), -(screwholeDiameter/2+screwnose_Wall_Thickness+additionalDistanceFromWall),0]) cube([(screwholeDiameter/2+screwnose_Wall_Thickness)*2, screwholeDiameter/2+screwnose_Wall_Thickness+additionalDistanceFromWall, noseHeight]);
			cylinder(r=(screwholeDiameter/2)+screwnose_Wall_Thickness, h=noseHeight, $fn=60);
		}
		cylinder(r=screwholeDiameter/2, h=noseHeight, $fn=60);
	}
}
box();
if (box_Size_X>box_Size_Y) {
	translate([0, box_Size_Y+5+screwnose_Diameter+screwnose_Wall_Thickness, 0]) lid();	
} else {
	translate([box_Size_X+5, 0, 0]) lid();	
}
